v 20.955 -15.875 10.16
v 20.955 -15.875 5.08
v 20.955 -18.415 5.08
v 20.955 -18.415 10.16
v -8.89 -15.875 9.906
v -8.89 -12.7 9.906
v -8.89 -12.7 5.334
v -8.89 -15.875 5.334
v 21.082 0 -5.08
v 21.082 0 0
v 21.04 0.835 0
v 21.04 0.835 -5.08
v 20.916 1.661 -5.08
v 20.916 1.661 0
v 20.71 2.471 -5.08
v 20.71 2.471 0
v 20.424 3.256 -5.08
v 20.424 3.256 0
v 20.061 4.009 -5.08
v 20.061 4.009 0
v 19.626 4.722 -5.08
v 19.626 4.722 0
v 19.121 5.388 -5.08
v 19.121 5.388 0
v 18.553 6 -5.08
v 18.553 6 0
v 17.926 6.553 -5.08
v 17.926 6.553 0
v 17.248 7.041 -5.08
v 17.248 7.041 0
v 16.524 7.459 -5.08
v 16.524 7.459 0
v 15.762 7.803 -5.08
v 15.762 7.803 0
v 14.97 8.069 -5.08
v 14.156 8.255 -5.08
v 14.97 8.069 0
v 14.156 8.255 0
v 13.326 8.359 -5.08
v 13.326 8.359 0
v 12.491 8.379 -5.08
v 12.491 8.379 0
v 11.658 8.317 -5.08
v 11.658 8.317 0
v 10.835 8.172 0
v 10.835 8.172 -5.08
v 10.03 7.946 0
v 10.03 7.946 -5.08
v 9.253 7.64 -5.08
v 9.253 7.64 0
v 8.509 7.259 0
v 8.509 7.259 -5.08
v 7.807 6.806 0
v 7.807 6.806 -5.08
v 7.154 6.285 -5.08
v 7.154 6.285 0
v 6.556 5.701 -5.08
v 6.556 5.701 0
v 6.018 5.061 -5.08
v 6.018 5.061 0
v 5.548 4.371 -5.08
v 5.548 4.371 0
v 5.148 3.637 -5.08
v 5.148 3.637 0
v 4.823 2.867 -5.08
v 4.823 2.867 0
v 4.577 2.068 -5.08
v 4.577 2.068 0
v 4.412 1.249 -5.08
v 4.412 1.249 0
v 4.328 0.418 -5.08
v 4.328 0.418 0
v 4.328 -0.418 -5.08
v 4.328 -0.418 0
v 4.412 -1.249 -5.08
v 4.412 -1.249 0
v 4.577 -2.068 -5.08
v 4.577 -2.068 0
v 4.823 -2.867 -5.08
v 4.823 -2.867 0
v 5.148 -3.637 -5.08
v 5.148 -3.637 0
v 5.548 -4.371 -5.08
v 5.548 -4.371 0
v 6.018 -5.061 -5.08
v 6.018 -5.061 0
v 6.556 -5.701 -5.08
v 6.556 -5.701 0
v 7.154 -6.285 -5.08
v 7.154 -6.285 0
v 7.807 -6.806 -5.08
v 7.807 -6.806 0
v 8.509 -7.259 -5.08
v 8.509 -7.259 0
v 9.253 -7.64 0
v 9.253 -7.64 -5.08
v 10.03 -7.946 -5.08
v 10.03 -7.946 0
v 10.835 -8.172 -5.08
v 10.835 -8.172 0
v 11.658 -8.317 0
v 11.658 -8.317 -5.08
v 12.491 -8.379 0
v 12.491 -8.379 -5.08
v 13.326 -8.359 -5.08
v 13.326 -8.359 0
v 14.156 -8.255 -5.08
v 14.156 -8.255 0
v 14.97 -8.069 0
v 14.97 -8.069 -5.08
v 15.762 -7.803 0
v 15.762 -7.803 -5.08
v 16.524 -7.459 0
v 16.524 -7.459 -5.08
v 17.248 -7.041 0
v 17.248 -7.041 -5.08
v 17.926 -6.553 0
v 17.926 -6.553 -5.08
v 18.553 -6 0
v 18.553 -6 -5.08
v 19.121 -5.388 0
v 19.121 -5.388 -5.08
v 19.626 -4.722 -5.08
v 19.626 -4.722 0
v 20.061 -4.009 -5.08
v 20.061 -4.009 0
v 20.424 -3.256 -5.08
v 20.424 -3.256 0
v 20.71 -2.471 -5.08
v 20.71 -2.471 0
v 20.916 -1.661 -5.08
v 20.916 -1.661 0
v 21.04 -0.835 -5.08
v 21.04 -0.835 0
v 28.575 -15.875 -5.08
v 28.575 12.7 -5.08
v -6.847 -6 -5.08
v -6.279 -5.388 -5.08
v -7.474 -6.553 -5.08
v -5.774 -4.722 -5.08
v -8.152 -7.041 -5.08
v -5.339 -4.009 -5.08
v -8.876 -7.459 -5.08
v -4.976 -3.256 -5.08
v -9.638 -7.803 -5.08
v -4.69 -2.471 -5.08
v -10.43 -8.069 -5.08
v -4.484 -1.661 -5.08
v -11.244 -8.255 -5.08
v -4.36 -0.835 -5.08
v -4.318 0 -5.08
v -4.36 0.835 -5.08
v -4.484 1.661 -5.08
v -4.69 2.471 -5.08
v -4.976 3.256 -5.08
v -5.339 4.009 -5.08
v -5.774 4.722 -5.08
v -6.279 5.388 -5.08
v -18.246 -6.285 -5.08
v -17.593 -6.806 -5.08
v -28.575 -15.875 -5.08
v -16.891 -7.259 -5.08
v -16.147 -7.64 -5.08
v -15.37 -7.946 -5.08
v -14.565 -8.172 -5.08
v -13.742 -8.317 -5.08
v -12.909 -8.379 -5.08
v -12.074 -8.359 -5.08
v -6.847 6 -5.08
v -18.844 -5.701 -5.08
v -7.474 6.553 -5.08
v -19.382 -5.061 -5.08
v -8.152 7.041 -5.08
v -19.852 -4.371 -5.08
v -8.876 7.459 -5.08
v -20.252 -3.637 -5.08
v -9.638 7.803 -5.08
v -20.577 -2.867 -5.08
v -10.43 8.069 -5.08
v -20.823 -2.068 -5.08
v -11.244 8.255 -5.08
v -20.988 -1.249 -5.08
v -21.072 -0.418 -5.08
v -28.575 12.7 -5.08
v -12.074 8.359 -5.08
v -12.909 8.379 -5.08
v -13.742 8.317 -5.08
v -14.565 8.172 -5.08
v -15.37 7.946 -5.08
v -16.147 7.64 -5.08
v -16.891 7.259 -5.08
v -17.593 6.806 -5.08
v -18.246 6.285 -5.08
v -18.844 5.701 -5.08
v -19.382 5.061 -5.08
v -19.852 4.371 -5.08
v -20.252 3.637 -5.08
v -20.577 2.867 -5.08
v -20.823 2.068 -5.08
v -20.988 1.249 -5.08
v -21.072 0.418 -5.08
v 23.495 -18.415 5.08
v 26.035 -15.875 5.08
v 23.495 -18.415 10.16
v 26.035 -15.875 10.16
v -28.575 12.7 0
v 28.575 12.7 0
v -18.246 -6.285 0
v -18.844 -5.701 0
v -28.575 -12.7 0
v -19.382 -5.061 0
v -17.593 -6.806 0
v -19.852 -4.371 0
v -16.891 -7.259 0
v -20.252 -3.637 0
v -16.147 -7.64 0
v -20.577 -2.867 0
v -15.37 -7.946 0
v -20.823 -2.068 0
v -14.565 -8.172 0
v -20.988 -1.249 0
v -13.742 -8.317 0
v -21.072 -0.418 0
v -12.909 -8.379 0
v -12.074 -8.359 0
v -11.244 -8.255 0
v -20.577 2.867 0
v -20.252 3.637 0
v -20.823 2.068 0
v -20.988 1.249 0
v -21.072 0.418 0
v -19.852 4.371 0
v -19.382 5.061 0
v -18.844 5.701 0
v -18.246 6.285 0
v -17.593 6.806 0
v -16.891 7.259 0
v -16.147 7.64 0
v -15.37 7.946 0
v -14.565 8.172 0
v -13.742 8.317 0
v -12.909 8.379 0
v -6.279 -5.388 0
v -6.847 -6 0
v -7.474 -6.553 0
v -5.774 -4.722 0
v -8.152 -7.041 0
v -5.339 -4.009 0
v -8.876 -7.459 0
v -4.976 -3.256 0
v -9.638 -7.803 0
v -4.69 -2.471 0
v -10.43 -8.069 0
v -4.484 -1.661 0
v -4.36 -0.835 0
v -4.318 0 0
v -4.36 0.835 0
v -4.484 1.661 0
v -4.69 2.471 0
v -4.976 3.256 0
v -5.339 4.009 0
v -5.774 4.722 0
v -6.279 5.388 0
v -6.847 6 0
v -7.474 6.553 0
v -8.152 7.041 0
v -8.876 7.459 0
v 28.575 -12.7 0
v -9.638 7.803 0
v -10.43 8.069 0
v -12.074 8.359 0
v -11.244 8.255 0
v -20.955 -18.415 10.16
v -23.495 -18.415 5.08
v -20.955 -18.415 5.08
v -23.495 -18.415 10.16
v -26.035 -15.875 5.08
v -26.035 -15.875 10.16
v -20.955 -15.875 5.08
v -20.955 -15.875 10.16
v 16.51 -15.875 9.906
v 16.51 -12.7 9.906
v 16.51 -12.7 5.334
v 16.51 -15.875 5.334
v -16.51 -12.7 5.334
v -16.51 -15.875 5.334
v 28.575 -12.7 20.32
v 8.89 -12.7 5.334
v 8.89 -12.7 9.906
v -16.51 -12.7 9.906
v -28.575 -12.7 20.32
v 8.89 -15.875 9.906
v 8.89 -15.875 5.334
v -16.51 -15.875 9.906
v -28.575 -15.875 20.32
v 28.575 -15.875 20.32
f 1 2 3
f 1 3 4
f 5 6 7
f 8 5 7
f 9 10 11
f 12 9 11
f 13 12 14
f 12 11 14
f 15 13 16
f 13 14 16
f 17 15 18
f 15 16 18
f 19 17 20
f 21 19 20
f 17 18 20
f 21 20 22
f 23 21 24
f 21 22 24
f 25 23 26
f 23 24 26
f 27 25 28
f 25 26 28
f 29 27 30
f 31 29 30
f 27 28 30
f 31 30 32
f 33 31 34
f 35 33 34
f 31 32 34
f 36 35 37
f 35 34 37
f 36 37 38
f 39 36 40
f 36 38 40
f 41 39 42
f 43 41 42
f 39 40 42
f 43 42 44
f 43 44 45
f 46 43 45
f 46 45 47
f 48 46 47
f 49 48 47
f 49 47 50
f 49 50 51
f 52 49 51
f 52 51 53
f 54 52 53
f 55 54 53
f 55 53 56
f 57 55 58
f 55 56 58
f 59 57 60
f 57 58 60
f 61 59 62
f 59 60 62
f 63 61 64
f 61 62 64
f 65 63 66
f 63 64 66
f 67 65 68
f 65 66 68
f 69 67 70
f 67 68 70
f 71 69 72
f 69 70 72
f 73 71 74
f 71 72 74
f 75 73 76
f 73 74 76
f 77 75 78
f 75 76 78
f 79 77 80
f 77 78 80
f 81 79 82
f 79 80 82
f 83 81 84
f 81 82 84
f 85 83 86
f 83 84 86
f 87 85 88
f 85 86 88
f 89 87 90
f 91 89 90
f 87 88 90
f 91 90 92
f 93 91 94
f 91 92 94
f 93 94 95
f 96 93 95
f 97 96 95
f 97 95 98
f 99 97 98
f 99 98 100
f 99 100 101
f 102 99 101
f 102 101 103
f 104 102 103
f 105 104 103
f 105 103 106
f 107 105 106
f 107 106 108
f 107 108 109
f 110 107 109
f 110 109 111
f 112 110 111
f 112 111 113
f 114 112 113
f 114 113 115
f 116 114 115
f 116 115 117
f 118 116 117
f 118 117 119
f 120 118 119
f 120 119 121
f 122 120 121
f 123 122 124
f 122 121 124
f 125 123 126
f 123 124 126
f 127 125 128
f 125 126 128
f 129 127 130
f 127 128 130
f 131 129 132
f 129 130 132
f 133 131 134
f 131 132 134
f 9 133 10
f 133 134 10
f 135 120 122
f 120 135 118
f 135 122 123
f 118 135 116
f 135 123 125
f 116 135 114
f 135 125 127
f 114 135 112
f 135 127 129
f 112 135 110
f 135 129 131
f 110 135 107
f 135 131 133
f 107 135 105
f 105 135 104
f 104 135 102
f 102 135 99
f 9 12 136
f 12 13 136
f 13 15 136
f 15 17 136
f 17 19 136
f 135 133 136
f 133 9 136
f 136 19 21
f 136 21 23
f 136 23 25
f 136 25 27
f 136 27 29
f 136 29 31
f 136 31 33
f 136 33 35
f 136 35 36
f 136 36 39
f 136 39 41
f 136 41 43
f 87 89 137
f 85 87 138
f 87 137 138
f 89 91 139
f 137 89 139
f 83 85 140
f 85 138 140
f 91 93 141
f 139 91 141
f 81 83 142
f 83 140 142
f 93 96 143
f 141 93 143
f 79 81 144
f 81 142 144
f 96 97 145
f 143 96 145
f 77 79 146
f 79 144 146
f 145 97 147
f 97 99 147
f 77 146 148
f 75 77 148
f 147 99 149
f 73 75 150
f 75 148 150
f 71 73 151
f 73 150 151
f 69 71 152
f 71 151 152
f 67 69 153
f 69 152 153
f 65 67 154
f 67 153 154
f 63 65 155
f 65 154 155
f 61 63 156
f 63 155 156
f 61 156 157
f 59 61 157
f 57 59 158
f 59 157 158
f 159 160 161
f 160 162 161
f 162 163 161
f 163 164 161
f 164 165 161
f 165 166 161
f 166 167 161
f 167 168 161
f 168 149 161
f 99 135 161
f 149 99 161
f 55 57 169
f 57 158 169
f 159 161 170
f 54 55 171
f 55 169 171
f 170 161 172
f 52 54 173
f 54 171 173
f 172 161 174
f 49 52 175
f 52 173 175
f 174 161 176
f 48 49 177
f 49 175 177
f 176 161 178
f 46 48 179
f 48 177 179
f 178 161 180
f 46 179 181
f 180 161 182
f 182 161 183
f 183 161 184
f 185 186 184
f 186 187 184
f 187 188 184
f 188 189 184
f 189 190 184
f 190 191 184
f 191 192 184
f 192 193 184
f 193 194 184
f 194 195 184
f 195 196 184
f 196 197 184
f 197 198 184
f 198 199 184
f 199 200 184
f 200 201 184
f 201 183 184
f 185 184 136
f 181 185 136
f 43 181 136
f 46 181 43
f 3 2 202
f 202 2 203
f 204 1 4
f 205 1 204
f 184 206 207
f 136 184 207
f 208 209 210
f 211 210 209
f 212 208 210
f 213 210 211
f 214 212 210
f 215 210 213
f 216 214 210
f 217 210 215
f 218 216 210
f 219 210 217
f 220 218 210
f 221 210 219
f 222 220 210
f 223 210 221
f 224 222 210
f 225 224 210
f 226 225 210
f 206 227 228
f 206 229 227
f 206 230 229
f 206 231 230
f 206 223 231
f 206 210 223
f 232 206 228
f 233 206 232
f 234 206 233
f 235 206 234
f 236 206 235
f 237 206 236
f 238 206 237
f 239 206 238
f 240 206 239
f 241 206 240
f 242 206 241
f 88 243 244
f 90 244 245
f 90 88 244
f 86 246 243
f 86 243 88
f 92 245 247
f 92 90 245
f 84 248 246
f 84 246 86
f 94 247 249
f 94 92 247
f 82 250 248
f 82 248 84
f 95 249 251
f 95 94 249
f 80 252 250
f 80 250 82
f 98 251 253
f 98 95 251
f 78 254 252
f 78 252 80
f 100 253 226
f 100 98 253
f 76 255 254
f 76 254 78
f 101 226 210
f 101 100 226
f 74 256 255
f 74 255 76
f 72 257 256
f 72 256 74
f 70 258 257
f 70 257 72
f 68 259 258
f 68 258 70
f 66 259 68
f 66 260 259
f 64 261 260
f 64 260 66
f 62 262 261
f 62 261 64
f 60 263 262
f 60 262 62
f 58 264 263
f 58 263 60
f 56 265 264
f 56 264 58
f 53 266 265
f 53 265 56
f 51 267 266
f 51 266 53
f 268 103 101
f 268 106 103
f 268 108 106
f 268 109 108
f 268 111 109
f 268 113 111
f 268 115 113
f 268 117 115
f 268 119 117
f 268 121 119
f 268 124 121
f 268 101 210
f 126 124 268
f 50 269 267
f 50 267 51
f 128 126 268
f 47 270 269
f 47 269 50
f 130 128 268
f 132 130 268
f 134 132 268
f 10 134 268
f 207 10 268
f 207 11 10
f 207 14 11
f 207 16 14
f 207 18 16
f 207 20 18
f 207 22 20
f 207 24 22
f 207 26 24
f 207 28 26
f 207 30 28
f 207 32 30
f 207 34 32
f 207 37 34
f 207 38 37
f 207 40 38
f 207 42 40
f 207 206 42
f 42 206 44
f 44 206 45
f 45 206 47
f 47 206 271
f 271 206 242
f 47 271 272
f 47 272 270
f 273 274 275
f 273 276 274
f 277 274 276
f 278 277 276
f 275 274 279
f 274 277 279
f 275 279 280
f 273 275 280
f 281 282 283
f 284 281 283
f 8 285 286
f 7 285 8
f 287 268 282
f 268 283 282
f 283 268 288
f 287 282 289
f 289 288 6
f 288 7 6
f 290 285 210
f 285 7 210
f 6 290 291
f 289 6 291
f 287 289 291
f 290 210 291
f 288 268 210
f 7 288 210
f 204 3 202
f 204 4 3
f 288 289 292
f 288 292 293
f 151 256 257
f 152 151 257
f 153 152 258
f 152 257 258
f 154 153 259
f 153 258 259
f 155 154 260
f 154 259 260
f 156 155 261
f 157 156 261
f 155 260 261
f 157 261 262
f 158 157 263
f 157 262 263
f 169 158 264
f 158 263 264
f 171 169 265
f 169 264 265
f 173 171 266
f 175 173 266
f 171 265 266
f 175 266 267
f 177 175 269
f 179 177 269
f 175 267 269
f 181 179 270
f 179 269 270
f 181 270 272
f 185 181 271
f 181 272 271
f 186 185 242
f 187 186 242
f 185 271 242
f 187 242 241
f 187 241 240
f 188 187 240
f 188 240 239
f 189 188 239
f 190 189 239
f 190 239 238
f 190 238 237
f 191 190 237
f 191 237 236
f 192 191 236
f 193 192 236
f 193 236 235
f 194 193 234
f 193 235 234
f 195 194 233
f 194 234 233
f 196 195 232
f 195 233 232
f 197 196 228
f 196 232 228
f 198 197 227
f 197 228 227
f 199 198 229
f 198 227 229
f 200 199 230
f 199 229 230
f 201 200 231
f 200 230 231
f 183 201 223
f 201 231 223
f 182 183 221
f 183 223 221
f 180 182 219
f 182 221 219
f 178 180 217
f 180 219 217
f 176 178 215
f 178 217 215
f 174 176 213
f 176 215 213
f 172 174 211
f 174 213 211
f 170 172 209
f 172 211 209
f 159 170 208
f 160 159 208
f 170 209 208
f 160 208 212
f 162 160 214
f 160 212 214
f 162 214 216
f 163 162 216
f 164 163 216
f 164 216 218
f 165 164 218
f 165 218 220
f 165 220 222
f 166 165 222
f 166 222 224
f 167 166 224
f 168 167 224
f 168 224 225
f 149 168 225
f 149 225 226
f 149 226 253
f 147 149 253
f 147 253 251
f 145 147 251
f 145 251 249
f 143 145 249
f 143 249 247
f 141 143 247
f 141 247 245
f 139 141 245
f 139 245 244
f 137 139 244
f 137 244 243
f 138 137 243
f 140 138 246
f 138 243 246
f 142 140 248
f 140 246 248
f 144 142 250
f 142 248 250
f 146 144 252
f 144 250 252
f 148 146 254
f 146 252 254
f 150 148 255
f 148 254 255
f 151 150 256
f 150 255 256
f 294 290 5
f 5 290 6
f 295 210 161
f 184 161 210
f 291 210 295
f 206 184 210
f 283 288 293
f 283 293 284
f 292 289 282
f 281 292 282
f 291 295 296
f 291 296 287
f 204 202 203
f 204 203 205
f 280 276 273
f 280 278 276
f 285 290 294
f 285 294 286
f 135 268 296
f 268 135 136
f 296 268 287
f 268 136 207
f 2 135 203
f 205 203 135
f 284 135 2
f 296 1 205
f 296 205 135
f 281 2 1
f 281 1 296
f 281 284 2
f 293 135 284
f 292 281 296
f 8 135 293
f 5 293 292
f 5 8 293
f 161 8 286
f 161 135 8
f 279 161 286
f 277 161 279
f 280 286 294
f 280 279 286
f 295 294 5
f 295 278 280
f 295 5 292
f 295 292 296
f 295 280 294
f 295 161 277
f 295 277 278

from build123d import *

# Parameters (mm, degrees)
SKETCH1_W           = 57.15
SKETCH1_H           = 25.4
SKETCH1_R           = 8.382
BOSS_EXTRUDE1_DEPTH = 5.08
SKETCH3_W           = 25.4
SKETCH3_H           = 3.175
BOSS_EXTRUDE2_DEPTH = 57.15
SKETCH4_W           = 7.62
SKETCH4_H           = 4.572
CUT_EXTRUDE1_DEPTH  = 5.08
SKETCH5_W           = 5.08
SKETCH5_H           = 5.08
BOSS_EXTRUDE3_DEPTH = 2.54
CHAMFER1_SIZE       = 2.54


with BuildPart() as part:
    # Sketch1 → Boss-Extrude1 (new body)
    with BuildSketch(Plane.XY):
        Rectangle(SKETCH1_W, SKETCH1_H)
        with Locations((-12.7, 0)):
            Circle(SKETCH1_R, mode=Mode.SUBTRACT)
        with Locations((12.7, 0)):
            Circle(SKETCH1_R, mode=Mode.SUBTRACT)
    extrude(amount=-BOSS_EXTRUDE1_DEPTH)

    # Sketch3 → Boss-Extrude2 (add)
    with BuildSketch(Plane.ZY.offset(28.575)):
        with Locations((7.62, -14.2875)):
            Rectangle(SKETCH3_W, SKETCH3_H)
    extrude(amount=-BOSS_EXTRUDE2_DEPTH)

    # Sketch4 → Cut-Extrude1 (cut)
    with BuildSketch(Plane(origin=(0, -12.7, 0), x_dir=(1, 0, 0), z_dir=(0, 1, 0))):
        with Locations((-12.7, -7.62)):
            Rectangle(SKETCH4_W, SKETCH4_H)
        with Locations((12.7, -7.62)):
            Rectangle(SKETCH4_W, SKETCH4_H)
    extrude(amount=-CUT_EXTRUDE1_DEPTH, mode=Mode.SUBTRACT)

    # Sketch5 → Boss-Extrude3 (add)
    with BuildSketch(Plane.XZ.offset(15.875)):
        with Locations((-23.495, 7.62)):
            Rectangle(SKETCH5_W, SKETCH5_H)
        with Locations((23.495, 7.62)):
            Rectangle(SKETCH5_W, SKETCH5_H)
    extrude(amount=BOSS_EXTRUDE3_DEPTH)

    # Chamfer1
    chamfer1_edges = [part.edges().sort_by_distance(p)[0] for p in [
        (26.035, -18.415, 7.62),
        (-26.035, -18.415, 7.62),
    ]]
    chamfer(chamfer1_edges, length=CHAMFER1_SIZE - 0.0001)  # a hair under: the kernel refuses the full size


solid = part.part
